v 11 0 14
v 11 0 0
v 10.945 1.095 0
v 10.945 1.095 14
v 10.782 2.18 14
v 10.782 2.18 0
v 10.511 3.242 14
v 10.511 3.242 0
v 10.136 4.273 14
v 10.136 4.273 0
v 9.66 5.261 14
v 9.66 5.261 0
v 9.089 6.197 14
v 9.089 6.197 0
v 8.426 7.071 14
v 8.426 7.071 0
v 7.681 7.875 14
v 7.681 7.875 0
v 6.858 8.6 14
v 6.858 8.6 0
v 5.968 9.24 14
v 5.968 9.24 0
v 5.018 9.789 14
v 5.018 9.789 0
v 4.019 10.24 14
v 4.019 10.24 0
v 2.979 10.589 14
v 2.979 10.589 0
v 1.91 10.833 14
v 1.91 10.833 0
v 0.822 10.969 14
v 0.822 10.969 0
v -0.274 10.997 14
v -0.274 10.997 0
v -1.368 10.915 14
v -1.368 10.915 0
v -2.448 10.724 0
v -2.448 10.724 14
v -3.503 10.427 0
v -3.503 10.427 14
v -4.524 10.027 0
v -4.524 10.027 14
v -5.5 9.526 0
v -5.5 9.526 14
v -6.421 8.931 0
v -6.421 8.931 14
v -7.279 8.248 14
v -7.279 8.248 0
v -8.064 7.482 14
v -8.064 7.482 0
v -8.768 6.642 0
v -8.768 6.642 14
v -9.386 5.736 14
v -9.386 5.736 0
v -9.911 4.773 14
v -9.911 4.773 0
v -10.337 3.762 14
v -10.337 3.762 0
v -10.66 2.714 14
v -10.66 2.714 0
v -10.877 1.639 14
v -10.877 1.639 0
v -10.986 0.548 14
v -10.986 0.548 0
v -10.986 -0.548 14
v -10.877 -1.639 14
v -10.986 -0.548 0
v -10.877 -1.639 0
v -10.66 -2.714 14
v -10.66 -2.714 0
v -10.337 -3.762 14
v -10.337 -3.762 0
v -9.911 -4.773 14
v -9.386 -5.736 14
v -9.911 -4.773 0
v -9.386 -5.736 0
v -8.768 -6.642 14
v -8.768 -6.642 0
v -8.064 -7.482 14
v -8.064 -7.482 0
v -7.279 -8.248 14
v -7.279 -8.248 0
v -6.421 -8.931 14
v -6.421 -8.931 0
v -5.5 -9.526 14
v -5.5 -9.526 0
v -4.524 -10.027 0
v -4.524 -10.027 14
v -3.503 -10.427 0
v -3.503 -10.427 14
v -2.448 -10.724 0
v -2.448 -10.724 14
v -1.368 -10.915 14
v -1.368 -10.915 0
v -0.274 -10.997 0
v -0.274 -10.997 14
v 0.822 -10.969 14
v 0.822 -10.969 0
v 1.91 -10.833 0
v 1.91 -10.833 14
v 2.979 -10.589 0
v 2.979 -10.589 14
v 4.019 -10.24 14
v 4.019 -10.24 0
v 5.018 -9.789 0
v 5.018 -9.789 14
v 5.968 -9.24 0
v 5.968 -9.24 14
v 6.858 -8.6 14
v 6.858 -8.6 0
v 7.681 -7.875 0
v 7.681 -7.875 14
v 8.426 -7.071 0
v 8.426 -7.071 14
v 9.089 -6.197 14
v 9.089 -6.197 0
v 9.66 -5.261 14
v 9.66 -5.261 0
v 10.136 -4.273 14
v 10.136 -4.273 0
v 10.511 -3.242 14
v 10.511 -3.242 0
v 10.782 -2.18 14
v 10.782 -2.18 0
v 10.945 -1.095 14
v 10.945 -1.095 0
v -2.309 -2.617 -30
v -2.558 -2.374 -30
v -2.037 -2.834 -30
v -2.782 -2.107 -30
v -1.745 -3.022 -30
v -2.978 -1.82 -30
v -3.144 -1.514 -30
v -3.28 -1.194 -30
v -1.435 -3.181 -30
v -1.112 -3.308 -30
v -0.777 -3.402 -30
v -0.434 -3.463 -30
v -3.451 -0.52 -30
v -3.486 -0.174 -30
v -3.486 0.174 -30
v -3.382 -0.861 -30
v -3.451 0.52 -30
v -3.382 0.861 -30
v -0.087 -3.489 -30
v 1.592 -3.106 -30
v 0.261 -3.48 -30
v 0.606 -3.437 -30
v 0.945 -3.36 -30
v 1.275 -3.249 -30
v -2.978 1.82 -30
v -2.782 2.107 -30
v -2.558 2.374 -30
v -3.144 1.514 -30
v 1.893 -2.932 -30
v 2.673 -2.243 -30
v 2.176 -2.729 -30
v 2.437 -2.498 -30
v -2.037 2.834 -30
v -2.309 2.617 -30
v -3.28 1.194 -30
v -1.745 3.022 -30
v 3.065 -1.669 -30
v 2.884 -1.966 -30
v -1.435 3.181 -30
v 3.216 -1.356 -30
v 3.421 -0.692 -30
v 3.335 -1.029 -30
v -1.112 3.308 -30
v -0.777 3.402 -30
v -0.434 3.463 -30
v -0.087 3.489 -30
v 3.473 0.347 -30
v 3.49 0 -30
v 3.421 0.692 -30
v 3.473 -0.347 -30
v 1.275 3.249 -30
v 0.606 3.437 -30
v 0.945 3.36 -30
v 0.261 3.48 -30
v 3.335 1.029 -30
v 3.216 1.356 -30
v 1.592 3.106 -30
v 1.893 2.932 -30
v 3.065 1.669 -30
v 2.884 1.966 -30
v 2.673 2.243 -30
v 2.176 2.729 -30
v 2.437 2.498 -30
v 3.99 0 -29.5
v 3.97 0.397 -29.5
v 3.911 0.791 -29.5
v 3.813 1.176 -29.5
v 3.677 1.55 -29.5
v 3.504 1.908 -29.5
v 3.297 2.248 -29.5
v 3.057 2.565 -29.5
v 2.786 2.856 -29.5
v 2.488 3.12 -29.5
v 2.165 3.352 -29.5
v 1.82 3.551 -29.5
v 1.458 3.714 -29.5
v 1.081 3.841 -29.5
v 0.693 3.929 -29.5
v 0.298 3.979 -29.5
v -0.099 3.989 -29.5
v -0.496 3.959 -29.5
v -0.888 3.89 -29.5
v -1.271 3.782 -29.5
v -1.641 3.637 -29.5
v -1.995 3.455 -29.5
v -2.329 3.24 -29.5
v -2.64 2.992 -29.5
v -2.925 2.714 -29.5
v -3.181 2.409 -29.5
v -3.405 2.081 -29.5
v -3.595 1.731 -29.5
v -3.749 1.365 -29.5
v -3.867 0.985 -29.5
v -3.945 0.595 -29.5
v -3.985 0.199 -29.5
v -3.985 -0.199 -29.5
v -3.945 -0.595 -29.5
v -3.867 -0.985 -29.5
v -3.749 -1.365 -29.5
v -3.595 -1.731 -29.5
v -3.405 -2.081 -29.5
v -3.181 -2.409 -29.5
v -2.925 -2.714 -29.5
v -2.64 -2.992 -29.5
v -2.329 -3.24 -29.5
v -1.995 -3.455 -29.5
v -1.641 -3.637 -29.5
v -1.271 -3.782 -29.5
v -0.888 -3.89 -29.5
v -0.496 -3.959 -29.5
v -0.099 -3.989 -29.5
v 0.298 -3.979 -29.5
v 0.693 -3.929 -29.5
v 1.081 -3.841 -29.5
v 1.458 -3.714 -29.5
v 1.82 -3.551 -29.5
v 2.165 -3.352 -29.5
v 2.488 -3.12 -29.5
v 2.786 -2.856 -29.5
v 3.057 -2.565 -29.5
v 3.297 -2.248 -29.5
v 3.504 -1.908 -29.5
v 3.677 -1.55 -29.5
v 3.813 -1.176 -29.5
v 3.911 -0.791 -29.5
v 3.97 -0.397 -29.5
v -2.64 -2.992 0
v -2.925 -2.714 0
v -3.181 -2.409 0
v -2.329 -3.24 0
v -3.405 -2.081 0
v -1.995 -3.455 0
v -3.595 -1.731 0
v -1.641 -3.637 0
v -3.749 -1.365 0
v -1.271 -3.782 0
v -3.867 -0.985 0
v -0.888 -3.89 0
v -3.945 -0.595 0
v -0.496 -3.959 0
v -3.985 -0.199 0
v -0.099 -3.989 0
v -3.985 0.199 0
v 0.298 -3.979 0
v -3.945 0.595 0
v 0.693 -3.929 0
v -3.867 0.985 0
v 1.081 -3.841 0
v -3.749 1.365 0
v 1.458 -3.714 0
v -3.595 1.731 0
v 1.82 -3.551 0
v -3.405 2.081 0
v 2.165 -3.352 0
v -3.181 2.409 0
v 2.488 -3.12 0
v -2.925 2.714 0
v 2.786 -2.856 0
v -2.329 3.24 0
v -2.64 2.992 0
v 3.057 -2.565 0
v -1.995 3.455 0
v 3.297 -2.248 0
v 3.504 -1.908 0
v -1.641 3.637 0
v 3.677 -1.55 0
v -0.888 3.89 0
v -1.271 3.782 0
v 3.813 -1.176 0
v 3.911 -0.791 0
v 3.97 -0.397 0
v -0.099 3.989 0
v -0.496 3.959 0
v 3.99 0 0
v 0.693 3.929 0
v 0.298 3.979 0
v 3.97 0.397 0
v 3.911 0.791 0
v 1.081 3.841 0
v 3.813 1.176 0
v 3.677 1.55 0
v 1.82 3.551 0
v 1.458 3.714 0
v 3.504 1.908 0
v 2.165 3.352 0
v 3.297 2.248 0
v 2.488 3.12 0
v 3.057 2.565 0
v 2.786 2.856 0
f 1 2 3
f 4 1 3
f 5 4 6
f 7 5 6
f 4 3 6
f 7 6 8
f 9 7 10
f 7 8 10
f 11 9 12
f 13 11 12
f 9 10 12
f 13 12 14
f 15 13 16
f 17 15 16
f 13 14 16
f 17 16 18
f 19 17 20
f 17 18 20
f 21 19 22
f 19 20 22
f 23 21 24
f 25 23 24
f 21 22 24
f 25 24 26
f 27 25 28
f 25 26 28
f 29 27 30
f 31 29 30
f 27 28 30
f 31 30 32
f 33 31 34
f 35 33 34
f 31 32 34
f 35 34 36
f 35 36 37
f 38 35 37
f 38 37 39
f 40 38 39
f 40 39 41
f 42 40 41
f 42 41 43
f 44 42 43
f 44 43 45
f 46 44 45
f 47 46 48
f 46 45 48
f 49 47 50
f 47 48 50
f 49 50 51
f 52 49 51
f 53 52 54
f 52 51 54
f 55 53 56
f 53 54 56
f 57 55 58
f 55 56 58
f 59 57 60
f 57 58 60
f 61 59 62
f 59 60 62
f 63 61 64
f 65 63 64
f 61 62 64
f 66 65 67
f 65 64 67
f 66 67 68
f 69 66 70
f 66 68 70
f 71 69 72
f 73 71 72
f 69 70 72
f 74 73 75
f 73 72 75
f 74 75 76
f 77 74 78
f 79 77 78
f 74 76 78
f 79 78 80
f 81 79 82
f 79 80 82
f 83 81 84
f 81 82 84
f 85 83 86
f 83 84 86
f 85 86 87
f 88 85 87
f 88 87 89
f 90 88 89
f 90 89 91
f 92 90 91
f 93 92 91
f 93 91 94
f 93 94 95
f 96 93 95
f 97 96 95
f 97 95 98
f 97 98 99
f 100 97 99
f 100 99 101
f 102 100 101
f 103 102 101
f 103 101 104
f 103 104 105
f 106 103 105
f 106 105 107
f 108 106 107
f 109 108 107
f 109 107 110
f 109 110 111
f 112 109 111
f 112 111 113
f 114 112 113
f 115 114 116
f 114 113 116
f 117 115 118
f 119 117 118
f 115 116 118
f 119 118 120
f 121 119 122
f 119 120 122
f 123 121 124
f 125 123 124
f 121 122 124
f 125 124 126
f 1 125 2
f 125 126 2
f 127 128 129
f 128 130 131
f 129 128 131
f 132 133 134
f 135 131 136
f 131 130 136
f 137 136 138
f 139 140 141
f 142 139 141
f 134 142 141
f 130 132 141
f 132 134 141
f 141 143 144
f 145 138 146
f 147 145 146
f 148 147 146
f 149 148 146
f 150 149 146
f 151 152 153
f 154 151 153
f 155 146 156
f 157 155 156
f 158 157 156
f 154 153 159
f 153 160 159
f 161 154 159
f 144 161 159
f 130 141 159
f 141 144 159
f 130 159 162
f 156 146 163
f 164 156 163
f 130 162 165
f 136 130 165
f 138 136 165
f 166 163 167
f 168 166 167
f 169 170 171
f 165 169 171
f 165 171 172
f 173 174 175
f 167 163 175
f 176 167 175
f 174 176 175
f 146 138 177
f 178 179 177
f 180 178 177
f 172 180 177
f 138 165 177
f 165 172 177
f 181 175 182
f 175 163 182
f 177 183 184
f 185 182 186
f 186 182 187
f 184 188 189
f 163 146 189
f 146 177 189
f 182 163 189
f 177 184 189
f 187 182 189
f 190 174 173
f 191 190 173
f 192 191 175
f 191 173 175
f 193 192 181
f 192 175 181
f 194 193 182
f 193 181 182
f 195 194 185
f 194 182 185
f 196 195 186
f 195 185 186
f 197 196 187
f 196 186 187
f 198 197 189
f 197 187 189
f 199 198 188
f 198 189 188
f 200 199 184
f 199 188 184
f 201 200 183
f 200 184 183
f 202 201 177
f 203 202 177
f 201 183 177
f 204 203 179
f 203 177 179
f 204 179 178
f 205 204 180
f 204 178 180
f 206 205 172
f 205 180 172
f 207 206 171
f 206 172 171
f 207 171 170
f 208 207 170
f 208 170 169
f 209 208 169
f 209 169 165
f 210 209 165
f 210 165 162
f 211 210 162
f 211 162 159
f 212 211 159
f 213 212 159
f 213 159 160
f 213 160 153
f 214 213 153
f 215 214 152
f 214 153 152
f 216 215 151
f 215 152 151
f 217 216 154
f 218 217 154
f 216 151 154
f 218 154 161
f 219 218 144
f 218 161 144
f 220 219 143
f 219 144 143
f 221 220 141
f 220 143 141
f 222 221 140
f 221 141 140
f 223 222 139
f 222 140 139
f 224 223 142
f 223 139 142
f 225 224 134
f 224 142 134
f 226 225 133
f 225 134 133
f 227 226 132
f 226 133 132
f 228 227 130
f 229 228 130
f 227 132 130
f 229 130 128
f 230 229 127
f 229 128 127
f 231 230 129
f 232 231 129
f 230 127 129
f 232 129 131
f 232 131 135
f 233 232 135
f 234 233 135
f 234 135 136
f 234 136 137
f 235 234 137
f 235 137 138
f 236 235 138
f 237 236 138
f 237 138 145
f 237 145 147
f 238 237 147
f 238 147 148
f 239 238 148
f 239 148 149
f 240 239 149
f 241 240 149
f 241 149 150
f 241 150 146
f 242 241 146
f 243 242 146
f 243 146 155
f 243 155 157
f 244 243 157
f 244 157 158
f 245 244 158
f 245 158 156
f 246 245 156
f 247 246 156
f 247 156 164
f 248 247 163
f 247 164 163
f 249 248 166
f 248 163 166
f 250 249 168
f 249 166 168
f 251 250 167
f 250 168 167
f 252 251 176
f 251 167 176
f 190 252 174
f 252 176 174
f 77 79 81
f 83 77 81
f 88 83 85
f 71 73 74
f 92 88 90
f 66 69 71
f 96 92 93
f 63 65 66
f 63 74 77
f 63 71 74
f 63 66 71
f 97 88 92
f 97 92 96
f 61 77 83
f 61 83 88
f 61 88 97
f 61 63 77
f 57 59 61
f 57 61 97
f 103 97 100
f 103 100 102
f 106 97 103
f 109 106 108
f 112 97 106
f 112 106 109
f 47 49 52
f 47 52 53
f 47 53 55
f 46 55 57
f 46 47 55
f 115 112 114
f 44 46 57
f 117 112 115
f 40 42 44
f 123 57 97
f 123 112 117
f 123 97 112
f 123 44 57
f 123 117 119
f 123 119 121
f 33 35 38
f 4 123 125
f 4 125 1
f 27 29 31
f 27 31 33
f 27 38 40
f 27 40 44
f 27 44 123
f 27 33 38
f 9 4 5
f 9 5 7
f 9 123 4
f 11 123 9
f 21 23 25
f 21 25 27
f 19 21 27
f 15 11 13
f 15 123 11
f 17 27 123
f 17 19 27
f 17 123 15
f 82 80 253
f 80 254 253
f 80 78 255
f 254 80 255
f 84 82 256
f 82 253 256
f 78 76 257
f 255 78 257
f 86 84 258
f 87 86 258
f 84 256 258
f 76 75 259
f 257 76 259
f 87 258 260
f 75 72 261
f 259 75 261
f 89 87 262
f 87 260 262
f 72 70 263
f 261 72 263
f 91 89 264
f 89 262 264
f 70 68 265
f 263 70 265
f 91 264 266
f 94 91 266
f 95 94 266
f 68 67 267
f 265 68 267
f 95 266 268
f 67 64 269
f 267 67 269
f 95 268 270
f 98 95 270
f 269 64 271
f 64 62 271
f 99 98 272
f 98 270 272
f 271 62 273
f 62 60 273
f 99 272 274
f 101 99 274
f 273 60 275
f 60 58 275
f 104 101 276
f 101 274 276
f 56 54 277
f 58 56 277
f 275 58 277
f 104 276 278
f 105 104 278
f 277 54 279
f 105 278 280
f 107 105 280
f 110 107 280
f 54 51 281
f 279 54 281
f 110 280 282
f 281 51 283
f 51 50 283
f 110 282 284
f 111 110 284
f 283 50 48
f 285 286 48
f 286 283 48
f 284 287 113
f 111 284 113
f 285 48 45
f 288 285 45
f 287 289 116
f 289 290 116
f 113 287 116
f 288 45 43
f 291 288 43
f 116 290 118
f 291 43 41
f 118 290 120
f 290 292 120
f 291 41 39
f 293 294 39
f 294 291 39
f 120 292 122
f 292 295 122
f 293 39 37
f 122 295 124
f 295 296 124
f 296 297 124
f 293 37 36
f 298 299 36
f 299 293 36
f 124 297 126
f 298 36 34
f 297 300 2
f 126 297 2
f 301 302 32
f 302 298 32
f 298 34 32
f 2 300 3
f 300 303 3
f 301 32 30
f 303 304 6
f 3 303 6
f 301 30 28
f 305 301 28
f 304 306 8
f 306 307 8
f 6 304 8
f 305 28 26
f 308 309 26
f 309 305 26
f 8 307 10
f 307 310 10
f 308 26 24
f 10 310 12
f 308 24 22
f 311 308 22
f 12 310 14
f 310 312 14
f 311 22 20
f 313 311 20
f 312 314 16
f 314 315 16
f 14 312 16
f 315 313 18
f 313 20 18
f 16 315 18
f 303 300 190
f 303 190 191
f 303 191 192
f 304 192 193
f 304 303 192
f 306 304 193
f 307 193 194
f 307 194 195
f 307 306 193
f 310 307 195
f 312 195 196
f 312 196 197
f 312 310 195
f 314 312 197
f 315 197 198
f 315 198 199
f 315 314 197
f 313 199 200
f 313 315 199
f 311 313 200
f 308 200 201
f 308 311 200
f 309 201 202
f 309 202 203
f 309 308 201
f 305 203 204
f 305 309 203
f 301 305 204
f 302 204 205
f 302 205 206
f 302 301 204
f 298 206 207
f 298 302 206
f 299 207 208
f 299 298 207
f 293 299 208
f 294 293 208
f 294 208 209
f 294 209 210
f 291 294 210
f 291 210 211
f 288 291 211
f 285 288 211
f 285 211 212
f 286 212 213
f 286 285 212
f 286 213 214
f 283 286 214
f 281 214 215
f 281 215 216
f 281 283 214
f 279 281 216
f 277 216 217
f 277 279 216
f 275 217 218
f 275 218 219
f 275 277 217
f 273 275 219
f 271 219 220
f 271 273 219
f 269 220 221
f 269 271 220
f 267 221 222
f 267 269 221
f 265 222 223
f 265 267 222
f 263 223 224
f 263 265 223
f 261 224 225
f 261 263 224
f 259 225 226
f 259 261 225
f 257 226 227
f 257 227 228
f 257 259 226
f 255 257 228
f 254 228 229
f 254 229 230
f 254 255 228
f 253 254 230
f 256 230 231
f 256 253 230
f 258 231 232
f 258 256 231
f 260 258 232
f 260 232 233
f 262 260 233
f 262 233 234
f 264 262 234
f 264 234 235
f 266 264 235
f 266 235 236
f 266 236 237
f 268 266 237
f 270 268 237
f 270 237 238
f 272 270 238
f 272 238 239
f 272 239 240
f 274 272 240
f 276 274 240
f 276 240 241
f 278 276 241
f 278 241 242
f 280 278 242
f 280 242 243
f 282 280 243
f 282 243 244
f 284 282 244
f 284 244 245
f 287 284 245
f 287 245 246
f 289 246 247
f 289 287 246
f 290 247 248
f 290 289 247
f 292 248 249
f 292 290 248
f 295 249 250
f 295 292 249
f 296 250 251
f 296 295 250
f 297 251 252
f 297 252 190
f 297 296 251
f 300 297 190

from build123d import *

# Parameters (mm, degrees)
F0_R     = 11
F1_DEPTH = 14
F2_R     = 3.99
F3_DEPTH = 30
F4_SIZE  = 0.5


with BuildPart() as f1:
    # F0 (on Top) → F1 (new body)
    with BuildSketch(Plane.XY):
        Circle(F0_R)
    extrude(amount=F1_DEPTH)

    # F2 (on Top) → F3 (join)
    with BuildSketch(Plane.XY):
        Circle(F2_R)
    extrude(amount=-F3_DEPTH)

    # F4
    f4_edges = [f1.edges().sort_by_distance(p)[0] for p in [
        (-3.99, 0, -30),
    ]]
    chamfer(f4_edges, length=F4_SIZE)


solid = f1.part
